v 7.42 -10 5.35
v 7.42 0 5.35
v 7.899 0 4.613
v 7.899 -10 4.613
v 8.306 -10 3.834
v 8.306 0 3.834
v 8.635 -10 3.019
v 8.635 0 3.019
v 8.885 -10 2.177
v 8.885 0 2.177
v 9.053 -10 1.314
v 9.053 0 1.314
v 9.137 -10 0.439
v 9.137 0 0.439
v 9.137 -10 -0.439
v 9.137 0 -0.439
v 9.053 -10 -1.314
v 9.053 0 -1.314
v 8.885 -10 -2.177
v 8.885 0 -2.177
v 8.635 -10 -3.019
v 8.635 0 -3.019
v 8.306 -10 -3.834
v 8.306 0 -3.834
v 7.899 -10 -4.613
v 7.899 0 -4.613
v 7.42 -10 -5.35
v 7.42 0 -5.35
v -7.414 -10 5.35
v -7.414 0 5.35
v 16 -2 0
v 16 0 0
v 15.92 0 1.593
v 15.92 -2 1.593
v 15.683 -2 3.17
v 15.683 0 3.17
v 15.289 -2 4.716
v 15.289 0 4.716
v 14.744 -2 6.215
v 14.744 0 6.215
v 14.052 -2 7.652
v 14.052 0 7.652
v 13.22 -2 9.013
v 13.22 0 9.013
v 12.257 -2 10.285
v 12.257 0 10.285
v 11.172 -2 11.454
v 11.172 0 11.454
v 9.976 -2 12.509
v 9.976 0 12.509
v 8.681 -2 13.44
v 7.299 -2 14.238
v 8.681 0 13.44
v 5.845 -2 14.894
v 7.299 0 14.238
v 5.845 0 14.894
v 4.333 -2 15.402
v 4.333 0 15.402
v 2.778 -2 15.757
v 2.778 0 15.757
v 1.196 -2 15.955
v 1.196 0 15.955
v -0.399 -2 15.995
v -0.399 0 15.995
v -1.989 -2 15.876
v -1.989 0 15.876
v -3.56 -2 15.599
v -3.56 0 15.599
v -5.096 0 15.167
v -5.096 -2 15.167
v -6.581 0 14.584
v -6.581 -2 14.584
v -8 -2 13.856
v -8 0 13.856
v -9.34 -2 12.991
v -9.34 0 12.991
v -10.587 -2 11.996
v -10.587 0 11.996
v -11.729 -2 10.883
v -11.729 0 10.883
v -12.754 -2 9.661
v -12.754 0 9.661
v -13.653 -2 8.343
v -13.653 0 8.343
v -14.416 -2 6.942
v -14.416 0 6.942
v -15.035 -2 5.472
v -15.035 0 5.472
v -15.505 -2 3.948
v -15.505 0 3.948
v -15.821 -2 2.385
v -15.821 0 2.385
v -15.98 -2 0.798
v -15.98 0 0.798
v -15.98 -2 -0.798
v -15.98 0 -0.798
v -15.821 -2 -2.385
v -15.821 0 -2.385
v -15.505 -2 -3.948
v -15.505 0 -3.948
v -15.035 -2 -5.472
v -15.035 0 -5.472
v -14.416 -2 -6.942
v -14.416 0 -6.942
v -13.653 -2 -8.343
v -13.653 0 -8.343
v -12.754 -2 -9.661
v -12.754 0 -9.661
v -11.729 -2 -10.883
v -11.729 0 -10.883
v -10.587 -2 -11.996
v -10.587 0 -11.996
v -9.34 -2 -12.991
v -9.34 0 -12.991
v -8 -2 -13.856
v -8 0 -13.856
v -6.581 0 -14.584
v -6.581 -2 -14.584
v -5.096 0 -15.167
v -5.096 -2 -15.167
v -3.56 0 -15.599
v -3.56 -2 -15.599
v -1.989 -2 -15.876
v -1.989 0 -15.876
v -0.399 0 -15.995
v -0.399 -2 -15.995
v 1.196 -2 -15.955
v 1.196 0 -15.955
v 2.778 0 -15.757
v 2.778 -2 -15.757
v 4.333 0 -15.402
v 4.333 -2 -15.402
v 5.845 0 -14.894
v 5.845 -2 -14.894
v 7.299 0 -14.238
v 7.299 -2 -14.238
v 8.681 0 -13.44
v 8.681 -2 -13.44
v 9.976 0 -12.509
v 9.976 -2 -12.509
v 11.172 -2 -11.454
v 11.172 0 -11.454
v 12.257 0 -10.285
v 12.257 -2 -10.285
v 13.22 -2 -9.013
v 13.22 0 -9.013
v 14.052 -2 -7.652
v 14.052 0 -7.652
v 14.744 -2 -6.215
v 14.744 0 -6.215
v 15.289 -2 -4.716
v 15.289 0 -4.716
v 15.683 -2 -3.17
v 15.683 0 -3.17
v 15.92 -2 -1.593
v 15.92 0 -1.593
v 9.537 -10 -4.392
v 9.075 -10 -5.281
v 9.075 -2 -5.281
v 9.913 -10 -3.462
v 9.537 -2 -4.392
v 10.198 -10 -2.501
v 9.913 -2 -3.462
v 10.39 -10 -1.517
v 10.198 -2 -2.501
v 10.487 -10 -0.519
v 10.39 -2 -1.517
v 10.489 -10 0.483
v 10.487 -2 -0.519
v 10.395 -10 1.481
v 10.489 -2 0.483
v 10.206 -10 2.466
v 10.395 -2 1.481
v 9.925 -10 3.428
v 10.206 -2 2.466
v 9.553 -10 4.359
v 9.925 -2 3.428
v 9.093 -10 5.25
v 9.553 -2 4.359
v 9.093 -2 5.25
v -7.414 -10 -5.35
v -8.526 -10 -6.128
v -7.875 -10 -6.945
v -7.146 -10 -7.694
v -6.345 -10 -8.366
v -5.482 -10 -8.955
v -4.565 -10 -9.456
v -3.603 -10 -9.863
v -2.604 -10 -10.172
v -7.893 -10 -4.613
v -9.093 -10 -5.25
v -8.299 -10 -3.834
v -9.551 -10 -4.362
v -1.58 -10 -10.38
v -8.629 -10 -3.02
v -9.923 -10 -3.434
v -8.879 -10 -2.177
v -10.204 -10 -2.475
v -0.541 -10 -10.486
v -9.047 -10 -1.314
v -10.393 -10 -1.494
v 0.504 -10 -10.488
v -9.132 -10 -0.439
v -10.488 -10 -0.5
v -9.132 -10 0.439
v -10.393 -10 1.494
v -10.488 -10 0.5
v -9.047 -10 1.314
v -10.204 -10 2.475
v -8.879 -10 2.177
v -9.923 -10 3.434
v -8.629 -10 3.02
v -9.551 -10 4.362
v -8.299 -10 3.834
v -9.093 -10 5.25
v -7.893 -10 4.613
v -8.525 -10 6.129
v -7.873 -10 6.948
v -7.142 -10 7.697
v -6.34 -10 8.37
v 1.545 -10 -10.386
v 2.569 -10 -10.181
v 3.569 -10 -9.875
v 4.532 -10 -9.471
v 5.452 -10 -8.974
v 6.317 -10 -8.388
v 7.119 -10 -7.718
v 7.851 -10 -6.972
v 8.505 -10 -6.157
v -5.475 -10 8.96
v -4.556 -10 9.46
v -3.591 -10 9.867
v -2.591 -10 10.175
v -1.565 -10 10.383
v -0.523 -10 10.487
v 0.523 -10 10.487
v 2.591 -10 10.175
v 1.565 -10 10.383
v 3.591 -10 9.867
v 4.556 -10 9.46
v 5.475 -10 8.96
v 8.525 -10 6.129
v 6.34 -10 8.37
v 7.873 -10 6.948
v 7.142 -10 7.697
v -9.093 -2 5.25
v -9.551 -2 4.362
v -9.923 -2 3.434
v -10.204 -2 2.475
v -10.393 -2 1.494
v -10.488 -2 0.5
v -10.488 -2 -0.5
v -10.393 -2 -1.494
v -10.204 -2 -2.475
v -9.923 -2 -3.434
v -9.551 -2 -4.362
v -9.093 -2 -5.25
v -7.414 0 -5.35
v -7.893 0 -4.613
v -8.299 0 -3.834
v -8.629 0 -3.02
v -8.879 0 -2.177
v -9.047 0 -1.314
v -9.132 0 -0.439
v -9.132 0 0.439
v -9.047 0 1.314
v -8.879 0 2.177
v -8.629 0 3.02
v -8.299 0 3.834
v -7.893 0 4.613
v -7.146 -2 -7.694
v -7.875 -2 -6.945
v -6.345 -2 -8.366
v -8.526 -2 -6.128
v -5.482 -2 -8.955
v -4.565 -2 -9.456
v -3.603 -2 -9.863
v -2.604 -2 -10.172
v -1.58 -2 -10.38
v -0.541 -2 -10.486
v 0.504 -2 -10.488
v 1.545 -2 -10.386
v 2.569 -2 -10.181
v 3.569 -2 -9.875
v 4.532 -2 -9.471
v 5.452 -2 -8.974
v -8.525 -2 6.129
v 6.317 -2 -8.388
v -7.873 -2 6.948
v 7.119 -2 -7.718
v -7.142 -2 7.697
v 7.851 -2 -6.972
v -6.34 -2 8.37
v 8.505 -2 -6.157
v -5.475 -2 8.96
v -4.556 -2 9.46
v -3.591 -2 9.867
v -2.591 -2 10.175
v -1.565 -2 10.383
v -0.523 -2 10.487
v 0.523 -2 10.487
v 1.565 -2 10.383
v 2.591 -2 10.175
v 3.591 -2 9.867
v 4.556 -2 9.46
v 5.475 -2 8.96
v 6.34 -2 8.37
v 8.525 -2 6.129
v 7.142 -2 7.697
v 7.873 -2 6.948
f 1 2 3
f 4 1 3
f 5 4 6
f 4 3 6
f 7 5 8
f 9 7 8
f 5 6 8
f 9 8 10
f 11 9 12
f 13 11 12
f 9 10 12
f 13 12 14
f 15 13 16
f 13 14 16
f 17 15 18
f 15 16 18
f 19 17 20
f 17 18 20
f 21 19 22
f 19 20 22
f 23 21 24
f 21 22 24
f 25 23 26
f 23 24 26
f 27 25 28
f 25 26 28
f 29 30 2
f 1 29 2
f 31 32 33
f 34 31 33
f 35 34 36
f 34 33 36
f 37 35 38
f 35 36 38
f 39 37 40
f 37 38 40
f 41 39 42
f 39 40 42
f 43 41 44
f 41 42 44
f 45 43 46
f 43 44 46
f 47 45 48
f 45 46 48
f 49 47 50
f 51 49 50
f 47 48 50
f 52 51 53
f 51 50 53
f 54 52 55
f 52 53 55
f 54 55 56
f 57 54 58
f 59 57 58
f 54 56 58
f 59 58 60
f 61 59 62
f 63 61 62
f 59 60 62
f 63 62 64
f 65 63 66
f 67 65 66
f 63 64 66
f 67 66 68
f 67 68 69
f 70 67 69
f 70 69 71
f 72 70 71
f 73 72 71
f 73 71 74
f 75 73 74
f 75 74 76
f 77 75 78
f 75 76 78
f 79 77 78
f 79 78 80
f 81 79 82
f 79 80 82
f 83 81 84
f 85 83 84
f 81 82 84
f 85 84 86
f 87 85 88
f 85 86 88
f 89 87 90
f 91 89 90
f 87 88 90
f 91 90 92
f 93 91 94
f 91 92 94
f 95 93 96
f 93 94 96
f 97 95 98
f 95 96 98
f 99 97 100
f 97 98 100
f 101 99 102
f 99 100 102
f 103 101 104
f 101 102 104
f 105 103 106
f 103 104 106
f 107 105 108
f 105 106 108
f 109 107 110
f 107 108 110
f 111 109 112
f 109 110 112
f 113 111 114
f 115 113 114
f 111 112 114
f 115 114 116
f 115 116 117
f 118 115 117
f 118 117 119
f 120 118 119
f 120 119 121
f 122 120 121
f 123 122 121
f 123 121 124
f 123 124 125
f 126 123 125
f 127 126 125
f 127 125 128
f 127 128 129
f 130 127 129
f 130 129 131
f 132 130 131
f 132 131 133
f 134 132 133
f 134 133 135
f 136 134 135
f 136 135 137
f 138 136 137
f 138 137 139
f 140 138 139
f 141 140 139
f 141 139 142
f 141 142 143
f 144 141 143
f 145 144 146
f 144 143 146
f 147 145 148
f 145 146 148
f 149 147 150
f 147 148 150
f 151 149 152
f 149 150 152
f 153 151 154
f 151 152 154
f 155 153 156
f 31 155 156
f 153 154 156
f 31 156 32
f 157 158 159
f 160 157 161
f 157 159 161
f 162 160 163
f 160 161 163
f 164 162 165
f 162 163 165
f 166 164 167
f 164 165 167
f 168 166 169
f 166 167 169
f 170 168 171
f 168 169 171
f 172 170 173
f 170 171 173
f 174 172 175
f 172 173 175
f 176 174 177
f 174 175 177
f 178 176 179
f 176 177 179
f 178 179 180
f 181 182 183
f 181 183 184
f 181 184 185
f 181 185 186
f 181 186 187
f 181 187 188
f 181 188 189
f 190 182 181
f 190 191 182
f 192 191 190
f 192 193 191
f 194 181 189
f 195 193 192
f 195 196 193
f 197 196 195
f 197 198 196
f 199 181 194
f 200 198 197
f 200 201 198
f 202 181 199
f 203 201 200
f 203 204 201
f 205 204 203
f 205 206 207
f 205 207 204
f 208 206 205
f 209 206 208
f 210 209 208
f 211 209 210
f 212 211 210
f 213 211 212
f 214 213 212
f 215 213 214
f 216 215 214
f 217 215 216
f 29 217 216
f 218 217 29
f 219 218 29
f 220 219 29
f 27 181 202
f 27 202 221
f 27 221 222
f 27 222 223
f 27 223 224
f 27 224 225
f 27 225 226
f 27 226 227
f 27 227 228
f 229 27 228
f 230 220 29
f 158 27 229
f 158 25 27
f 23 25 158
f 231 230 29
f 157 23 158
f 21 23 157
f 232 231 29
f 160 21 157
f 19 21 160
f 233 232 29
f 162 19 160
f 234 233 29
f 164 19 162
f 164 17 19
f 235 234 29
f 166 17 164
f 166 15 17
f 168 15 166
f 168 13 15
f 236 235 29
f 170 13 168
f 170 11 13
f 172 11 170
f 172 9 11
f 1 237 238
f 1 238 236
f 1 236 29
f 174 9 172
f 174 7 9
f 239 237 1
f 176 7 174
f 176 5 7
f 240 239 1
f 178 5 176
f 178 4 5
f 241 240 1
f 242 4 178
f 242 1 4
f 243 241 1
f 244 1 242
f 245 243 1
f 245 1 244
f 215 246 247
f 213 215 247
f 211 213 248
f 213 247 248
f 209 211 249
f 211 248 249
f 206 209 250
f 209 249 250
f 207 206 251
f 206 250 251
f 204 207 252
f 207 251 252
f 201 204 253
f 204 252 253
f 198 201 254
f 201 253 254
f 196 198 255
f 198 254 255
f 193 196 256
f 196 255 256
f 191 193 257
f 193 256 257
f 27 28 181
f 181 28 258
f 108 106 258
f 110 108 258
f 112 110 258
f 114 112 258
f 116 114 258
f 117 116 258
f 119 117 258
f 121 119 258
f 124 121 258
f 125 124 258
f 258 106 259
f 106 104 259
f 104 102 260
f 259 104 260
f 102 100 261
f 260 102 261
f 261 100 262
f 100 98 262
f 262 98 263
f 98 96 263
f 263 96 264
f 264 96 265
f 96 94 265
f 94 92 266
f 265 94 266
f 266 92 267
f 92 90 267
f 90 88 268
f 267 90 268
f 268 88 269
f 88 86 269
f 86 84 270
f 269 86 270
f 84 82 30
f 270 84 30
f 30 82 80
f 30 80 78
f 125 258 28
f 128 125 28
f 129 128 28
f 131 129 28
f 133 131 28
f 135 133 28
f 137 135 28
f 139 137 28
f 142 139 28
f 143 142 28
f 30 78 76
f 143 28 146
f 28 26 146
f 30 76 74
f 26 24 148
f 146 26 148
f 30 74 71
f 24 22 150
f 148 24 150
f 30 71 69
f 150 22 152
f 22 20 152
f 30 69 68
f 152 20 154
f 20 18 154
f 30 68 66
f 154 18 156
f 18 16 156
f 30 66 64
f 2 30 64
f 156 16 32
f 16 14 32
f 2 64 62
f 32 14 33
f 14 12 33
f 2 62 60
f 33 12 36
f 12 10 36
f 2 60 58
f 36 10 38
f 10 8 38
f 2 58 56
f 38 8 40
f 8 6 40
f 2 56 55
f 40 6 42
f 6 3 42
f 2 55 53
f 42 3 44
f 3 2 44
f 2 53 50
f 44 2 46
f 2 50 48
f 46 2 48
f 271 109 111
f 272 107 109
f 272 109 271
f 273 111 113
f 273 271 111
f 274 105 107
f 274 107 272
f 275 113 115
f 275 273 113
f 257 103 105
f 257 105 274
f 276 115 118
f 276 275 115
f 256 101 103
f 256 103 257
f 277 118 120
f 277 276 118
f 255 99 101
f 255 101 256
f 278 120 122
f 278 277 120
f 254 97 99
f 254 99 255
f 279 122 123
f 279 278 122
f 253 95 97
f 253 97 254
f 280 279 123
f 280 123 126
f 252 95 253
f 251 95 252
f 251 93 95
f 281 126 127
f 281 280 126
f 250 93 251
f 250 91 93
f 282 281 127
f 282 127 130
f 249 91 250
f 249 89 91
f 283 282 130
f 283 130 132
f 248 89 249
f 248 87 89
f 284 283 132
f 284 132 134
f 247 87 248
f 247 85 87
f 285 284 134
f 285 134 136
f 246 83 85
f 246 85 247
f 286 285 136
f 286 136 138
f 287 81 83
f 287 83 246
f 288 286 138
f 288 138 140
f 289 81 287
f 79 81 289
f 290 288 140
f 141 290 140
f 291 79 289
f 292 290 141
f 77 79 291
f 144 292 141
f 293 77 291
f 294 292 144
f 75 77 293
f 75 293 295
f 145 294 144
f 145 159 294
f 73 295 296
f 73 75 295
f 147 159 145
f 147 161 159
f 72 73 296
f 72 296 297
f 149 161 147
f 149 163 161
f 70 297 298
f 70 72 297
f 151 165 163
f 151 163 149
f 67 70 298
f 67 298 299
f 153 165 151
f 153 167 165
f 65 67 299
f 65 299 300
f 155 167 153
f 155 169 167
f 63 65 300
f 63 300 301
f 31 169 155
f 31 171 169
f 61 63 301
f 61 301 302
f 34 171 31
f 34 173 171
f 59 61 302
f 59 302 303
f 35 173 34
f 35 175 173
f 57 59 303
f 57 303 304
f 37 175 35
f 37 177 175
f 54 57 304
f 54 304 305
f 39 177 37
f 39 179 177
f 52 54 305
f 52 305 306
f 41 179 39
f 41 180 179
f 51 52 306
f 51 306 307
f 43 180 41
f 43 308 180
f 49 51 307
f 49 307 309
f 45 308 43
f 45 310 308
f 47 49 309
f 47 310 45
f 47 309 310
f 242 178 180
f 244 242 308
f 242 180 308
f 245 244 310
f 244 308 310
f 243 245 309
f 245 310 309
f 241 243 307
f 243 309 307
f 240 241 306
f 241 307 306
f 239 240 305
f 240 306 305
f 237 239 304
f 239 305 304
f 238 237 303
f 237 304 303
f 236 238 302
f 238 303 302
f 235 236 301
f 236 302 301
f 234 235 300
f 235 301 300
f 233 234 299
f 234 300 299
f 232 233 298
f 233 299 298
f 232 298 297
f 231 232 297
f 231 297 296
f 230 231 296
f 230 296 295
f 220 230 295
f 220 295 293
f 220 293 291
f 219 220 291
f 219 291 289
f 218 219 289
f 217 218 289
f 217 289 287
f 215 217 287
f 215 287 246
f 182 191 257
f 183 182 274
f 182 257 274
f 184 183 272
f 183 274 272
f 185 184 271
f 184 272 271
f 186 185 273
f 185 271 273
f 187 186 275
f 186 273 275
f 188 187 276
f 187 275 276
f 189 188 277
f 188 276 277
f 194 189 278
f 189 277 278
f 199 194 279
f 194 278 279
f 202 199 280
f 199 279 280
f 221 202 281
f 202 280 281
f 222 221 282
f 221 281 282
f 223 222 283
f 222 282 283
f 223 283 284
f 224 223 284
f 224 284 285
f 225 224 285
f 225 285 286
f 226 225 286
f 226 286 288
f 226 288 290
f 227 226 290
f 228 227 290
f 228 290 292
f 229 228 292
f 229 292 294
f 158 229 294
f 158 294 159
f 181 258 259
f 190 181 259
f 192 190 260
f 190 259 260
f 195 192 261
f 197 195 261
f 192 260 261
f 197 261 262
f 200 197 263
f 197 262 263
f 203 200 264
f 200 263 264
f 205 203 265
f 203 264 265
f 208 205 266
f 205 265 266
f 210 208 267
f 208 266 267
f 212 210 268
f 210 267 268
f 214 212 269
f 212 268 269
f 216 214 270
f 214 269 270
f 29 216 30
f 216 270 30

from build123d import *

# Parameters (mm, degrees)
F0_R     = 16
F0_R_2   = 9.5
F1_DEPTH = 2
F3_DEPTH = 10


with BuildPart() as f1:
    # F0 (on Front) → F1 (new body)
    with BuildSketch(Plane.XZ):
        Circle(F0_R)
        Circle(F0_R_2, mode=Mode.SUBTRACT)
    extrude(amount=F1_DEPTH)

    # F2 (on Front) → F3 (join)
    with BuildSketch(Plane.XZ):
        with BuildLine():
            ThreePointArc((9.075132, -5.281286), (10.499984, -0.018081), (9.093267, 5.25))
            ThreePointArc((9.093267, 5.25), (0, 10.5), (-9.093267, 5.25))
            ThreePointArc((-9.093267, 5.25), (-10.5, 0), (-9.093267, -5.25))
            ThreePointArc((-9.093267, -5.25), (-0.018081, -10.499984), (9.075132, -5.281286))
        make_face()
        with BuildLine():
            ThreePointArc((-7.413502, -5.35), (-9.142347, 0), (-7.413502, 5.35))
            Line((-7.413502, 5.35), (7.420145, 5.35))
            ThreePointArc((7.420145, 5.35), (9.147735, 0), (7.420145, -5.35))
            Line((7.420145, -5.35), (-7.413502, -5.35))
        make_face(mode=Mode.SUBTRACT)
    extrude(amount=F3_DEPTH)


solid = f1.part
